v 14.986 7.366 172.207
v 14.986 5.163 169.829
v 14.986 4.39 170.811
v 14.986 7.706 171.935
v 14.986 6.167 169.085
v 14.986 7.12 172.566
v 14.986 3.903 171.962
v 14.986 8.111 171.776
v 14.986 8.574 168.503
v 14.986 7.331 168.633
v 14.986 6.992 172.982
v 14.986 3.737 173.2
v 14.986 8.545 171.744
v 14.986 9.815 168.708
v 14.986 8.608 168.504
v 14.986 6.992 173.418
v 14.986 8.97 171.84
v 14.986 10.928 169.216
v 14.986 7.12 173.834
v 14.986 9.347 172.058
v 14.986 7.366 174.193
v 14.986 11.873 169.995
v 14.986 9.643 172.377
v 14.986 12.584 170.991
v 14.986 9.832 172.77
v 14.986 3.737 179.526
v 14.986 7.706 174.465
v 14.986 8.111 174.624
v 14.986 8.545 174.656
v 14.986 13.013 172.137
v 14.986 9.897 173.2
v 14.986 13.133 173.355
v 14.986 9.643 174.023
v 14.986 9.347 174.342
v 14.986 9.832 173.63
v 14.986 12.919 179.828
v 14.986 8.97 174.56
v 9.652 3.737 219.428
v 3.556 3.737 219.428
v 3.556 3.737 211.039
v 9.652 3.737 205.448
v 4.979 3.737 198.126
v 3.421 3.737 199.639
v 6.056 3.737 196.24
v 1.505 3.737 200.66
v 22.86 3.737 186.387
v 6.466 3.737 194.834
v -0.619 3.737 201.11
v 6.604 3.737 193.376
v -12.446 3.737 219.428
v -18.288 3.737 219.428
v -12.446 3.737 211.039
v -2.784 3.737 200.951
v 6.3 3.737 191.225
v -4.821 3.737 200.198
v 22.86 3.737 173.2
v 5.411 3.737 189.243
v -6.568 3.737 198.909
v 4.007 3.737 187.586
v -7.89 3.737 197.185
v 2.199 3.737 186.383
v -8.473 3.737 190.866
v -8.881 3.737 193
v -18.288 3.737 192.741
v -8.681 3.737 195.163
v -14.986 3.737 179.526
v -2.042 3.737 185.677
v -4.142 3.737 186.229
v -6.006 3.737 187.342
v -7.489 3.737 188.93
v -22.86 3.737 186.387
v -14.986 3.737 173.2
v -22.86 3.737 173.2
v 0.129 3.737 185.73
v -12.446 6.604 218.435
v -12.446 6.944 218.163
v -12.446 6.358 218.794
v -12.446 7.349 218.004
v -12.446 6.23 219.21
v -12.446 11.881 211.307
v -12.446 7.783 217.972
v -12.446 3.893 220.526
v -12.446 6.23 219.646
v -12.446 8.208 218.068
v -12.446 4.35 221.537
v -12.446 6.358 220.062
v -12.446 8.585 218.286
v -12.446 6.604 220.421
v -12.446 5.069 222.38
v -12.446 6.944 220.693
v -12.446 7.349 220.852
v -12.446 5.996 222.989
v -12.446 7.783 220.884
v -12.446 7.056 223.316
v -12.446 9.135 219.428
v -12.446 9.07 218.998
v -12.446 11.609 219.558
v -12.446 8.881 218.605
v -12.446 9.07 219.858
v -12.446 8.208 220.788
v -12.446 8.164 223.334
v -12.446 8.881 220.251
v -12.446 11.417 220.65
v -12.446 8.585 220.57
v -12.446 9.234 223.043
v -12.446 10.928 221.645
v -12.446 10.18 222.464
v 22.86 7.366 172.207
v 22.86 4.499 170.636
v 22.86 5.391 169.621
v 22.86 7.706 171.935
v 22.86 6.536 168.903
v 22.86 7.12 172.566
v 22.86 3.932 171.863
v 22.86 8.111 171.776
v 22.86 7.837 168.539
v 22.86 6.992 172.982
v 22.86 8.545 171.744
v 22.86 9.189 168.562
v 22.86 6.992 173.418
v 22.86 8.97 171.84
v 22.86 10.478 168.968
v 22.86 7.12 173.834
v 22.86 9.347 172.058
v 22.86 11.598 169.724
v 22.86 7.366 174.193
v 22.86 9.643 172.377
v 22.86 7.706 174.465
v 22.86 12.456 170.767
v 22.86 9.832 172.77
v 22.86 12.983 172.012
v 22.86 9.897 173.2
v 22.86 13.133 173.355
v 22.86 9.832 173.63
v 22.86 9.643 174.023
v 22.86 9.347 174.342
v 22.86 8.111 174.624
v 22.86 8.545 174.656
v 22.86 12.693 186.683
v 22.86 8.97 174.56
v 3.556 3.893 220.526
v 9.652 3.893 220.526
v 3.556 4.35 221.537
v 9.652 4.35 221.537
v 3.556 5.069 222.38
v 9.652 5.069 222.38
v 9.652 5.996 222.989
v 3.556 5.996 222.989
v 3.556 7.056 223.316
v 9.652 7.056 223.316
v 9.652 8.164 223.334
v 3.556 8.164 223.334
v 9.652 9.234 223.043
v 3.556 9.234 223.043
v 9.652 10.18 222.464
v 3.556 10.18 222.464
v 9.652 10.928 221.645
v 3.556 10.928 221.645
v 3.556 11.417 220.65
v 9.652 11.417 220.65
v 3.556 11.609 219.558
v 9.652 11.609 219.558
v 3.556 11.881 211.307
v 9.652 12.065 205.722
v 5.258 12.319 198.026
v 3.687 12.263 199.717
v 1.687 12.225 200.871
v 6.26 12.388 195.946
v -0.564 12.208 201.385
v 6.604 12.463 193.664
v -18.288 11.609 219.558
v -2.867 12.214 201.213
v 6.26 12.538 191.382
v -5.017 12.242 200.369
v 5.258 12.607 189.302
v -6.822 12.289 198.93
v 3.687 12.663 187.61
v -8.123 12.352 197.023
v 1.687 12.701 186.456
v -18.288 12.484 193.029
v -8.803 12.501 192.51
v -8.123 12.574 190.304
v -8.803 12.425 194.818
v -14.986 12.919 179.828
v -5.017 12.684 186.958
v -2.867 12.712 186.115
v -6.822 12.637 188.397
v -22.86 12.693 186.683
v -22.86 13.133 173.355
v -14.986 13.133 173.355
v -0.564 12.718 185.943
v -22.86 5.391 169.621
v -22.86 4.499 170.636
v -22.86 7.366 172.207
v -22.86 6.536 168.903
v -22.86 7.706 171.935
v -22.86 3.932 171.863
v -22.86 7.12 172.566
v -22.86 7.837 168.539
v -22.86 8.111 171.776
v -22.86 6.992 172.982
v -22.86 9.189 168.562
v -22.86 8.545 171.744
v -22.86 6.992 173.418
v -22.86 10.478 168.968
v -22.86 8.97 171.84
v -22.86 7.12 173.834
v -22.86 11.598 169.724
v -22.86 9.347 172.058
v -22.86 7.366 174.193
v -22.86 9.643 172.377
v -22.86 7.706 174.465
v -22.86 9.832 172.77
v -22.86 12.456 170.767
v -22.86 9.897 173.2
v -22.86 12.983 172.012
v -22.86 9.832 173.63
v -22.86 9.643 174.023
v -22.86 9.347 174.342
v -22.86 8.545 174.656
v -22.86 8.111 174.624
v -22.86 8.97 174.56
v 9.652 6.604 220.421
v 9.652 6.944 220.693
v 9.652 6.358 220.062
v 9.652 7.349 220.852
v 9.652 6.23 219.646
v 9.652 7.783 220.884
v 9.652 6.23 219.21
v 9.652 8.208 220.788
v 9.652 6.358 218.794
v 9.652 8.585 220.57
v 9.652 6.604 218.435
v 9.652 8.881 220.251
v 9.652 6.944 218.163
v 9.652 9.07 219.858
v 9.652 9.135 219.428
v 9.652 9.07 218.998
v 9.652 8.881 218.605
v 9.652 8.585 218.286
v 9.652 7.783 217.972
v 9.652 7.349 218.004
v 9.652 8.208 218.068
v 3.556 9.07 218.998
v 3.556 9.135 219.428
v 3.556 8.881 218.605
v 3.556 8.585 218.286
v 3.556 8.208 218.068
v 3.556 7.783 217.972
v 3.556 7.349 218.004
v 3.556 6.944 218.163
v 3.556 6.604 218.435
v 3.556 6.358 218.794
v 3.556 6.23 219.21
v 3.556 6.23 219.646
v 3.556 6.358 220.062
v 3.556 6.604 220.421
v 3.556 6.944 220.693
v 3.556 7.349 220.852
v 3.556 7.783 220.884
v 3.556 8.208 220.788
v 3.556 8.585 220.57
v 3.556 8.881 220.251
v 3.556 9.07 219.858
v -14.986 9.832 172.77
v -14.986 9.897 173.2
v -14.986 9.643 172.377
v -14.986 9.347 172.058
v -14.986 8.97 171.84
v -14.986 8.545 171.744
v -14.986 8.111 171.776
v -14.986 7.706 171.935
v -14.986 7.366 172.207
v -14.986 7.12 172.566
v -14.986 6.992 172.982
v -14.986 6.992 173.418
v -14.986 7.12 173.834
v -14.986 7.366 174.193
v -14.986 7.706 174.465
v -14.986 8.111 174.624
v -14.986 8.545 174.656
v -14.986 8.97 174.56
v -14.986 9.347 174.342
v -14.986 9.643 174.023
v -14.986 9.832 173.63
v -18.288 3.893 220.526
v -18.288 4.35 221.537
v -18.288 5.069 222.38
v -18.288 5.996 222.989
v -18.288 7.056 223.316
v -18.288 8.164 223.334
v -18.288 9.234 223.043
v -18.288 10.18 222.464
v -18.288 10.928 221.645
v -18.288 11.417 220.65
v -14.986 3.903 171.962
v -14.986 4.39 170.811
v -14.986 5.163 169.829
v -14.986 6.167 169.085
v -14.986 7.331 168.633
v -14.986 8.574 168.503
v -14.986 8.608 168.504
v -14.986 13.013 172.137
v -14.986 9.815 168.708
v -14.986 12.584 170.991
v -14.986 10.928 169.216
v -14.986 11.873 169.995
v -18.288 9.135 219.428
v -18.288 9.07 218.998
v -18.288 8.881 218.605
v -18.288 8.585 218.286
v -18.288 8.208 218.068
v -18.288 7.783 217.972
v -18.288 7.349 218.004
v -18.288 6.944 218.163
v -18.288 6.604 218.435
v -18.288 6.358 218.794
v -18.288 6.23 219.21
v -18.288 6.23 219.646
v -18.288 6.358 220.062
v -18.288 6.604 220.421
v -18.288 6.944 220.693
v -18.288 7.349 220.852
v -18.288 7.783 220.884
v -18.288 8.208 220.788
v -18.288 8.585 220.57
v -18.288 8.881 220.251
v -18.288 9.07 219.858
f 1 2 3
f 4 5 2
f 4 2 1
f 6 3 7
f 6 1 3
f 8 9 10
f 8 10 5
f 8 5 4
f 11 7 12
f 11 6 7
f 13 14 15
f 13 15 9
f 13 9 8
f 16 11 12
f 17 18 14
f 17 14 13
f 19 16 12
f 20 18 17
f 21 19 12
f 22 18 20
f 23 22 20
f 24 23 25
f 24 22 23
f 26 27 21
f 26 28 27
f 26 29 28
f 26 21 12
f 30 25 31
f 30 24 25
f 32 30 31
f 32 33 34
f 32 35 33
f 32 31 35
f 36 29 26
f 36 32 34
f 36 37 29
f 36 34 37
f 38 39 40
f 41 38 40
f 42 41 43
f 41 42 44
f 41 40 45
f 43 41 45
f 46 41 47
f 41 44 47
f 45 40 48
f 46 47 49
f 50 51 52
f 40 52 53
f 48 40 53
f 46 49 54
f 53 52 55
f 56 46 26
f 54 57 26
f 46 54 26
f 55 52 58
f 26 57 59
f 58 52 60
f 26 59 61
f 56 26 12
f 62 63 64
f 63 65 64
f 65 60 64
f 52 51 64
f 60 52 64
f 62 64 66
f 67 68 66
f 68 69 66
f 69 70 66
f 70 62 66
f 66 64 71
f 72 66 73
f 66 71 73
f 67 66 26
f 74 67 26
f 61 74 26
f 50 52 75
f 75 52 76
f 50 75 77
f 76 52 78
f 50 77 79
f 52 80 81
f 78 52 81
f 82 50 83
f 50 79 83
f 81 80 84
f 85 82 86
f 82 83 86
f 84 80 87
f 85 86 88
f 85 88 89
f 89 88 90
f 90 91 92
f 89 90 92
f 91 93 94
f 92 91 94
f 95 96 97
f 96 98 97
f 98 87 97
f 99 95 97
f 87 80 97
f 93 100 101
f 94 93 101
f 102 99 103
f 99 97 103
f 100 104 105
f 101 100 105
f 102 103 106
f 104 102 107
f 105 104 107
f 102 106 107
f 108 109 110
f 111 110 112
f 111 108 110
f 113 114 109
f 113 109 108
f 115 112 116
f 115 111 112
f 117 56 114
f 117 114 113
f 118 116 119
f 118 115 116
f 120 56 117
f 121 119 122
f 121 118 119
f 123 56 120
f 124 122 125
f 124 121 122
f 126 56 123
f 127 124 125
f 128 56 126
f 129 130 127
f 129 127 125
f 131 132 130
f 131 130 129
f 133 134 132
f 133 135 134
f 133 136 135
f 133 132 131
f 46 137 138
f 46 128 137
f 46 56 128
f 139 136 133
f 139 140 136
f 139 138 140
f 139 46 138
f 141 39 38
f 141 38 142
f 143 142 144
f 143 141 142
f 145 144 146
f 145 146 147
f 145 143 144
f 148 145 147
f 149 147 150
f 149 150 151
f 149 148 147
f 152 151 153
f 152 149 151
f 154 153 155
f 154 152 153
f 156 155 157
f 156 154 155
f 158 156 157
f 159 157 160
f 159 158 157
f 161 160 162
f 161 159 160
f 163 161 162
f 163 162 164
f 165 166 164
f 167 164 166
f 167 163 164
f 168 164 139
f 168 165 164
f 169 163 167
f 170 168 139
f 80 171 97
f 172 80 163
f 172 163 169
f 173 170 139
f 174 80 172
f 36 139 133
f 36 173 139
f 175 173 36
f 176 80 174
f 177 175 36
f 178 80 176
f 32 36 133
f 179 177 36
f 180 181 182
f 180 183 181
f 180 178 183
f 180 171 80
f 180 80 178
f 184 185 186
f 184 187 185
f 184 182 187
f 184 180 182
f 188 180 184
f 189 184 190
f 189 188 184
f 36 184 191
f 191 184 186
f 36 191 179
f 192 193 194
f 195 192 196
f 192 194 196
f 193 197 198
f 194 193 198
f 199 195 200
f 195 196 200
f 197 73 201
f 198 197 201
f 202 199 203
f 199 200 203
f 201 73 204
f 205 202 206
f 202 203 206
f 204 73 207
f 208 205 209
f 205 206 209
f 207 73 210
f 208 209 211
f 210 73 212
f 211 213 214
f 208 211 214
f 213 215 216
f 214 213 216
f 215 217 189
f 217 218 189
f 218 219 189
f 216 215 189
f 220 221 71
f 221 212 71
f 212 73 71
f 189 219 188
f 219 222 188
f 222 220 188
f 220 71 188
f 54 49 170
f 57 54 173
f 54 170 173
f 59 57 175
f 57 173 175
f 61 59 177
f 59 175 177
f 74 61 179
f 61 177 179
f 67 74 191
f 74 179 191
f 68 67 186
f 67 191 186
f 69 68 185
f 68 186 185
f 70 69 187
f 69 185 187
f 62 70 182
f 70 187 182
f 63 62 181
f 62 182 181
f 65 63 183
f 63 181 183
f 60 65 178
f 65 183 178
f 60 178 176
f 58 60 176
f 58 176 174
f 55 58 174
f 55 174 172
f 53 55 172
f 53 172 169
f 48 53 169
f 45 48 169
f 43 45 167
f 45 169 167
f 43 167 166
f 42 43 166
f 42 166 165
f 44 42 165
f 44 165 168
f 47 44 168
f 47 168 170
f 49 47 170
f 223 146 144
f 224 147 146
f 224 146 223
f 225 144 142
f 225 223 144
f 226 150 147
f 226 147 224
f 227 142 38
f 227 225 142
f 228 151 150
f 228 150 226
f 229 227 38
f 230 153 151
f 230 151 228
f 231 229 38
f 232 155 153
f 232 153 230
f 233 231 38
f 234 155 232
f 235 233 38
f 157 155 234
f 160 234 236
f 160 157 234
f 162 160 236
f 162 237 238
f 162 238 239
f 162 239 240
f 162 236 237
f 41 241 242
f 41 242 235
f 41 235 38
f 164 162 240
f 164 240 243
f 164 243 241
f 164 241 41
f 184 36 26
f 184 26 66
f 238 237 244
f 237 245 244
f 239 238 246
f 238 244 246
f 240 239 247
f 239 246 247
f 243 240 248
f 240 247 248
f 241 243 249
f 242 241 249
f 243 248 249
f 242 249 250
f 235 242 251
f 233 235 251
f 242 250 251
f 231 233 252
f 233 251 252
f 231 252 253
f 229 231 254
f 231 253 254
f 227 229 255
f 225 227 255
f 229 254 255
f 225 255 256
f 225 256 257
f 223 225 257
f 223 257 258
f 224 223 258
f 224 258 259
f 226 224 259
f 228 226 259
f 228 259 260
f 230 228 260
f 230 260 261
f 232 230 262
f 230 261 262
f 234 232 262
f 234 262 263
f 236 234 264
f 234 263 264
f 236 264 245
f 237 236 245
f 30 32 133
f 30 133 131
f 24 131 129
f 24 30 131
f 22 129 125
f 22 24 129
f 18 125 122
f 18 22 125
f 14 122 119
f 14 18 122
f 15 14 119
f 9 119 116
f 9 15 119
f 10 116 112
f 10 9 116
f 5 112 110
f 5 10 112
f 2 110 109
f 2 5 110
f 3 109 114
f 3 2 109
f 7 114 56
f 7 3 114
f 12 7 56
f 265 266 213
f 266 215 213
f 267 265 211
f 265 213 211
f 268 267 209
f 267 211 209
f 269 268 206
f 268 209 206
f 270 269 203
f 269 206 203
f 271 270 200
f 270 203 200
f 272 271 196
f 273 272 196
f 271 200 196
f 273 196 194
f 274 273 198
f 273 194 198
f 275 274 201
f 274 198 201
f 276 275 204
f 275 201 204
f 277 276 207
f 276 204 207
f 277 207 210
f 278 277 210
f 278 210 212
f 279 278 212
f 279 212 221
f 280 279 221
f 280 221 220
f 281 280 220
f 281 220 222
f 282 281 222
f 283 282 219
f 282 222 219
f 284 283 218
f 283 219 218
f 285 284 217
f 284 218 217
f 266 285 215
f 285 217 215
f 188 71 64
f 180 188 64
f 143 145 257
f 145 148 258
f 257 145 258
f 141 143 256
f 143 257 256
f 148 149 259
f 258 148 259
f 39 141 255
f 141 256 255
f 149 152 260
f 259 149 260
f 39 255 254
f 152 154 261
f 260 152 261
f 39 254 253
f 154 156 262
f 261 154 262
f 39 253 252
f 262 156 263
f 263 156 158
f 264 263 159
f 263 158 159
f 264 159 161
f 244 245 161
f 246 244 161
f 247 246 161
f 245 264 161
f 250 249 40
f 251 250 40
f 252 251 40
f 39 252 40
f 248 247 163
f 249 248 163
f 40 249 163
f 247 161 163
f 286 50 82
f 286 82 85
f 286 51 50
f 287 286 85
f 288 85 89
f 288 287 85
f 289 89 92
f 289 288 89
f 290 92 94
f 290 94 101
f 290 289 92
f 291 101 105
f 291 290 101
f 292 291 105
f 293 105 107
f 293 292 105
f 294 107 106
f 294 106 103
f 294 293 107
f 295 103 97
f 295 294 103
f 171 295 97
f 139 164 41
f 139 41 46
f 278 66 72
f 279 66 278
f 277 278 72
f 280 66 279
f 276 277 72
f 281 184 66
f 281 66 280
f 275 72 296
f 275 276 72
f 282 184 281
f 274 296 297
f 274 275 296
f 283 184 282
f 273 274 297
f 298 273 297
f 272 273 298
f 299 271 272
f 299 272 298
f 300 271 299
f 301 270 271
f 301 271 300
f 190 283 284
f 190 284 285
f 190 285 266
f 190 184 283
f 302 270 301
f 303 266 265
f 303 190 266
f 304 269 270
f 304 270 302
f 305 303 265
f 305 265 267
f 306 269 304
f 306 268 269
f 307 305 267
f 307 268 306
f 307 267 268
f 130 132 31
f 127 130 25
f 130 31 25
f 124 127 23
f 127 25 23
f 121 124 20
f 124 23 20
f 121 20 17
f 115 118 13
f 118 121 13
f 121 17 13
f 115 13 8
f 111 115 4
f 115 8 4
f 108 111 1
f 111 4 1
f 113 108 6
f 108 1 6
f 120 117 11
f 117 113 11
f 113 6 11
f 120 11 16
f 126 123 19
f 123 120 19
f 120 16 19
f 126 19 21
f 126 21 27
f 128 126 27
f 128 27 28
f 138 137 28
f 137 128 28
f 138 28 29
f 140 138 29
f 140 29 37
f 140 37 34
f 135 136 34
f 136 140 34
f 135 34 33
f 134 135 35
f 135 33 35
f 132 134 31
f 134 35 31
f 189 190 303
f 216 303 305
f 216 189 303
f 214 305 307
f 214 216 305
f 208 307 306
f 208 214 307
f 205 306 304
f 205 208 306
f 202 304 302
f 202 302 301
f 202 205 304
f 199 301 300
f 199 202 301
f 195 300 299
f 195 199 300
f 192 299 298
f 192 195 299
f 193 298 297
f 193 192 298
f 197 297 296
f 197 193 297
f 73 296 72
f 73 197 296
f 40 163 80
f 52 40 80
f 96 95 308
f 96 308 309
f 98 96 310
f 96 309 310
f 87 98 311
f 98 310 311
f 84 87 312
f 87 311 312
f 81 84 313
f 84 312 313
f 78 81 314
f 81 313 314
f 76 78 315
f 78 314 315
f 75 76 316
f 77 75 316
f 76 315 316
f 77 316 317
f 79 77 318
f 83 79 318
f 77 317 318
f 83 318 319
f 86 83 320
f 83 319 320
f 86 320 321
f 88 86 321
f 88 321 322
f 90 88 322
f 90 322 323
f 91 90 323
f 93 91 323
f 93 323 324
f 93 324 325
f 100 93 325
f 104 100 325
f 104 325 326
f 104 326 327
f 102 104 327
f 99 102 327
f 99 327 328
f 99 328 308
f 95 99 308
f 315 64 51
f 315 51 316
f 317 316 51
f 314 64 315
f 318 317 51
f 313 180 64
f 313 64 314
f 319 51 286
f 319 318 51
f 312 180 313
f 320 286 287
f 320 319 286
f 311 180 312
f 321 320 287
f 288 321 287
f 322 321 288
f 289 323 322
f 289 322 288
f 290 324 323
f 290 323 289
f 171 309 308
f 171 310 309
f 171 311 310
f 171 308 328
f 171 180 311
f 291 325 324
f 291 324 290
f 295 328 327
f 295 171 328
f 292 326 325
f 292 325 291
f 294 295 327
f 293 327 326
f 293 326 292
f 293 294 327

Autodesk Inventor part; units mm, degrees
ref_plane "YZ Plane" through (0, 0, 0) normal (1, 0, 0) x (0, 1, 0)
sketch "Sketch2" plane through (0, 0, 0) normal (1, 0, 0) x (0, 1, 0)
  arc A0 (11.6091, 219.5578) -> (3.7373, 219.428) centre (7.6743, 219.428) ccw
  circle A1 centre (7.6743, 219.428) radius 1.4605
  arc A2 (3.7373, 173.2) -> (13.1327, 173.3549) centre (8.4363, 173.2) ccw
  circle A3 centre (8.4363, 173.2) radius 1.4605
  line L0 (3.7373, 219.428) -> (3.7373, 173.2)
  line L1 (39.8145, 223.365) -> (24.6856, 223.365) construction
  line L2 (42.3544, 168.501) -> (22.3114, 168.501) construction
  line L3 (11.6091, 219.5578) -> (13.1327, 173.3549)
  point P0 (0, 0)
  point P1 (32.3329, 168.501)
  dimension "d0" = 7.874
  dimension "d1" = 2.921
  dimension "d2" = 9.398
  dimension "d3" = 2.921
  dimension "d4" = 54.864
extrude "Extrusion1" add sketch "Sketch2" along normal mid plane 45.72
sketch "Sketch3" plane through (-22.86, 13.1327, 173.3549) normal (0, 0.9994567, 0.0329581) x (1, 0, 0)
  line L0 (0, 0) -> (0, -46.228) projected
  line L1 (0, -50.165) -> (45.72, -50.165) projected
  line L2 (0, 4.699) -> (45.72, 4.699) projected
  line L3 (45.72, 4.699) -> (45.72, -0.1549) projected
  line L4 (0, -0.1549) -> (0, 4.699) projected
  line L5 (0, -50.165) -> (0, -46.228) projected
  line L6 (10.414, -50.165) -> (26.416, -50.165)
  line L7 (26.416, -50.165) -> (26.416, -37.973)
  line L8 (26.416, -37.973) -> (10.414, -37.973)
  line L9 (10.414, -37.973) -> (10.414, -50.165)
  line L10 (0, -50.165) -> (0, -13.335)
  line L11 (0, -13.335) -> (4.572, -19.685)
  line L12 (4.572, -19.685) -> (4.572, -50.165)
  line L13 (4.572, -50.165) -> (0, -50.165)
  line L14 (47.5768, -13.335) -> (-11.8241, -13.335) construction
  line L15 (7.874, 4.699) -> (37.846, 4.699)
  line L16 (37.846, 4.699) -> (37.846, -6.477)
  line L17 (37.846, -6.477) -> (7.874, -6.477)
  line L18 (7.874, -6.477) -> (7.874, 4.699)
  line L19 (45.72, -46.228) -> (45.72, 0) projected
  line L20 (45.72, -13.335) -> (45.72, -50.165)
  line L21 (45.72, -50.165) -> (32.512, -50.165)
  line L22 (32.512, -50.165) -> (32.512, -32.385)
  line L23 (32.512, -32.385) -> (45.72, -13.335)
  circle A0 centre (21.717, -20.32) radius 7.747
  line L24 (13.97, -14.4458) -> (13.97, -24.81) construction
  line L25 (12.0083, -12.573) -> (20.6899, -12.573) construction
  point P0 (22.86, 172.8279)
  point P1 (0, -46.3578)
  dimension "d10" = 5.842
  dimension "d12" = 16.002
  dimension "d14" = 30.48
  dimension "d16" = 7.874
  dimension "d17" = 11.176
  dimension "d18" = 12.192
  dimension "d21" = 36.83
  dimension "d22" = 6.096
  dimension "d24" = 17.78
  dimension "d25" = 15.494
  dimension "d26" = 6.096
  dimension "d27" = 9.398
  dimension "d28" = 29.972
  dimension "d29" = 4.572
extrude "Extrusion2" cut sketch "Sketch3" against normal through all contours L11 L12 L1 L5 L0 | L2 L16 L17 L18 | L9 L8 L7 L1 | L22 L23 L19 L20 L1 | A0
ref_plane "Work Plane1" through (0, 7.6743, 223.365) normal (0, 0, 1) x (1, 0, 0)
ref_plane "Work Plane2" through (0, 8.4363, 168.501) normal (0, 0, 1) x (1, 0, 0)
properties part number "Transmission Plate - Bottom"
